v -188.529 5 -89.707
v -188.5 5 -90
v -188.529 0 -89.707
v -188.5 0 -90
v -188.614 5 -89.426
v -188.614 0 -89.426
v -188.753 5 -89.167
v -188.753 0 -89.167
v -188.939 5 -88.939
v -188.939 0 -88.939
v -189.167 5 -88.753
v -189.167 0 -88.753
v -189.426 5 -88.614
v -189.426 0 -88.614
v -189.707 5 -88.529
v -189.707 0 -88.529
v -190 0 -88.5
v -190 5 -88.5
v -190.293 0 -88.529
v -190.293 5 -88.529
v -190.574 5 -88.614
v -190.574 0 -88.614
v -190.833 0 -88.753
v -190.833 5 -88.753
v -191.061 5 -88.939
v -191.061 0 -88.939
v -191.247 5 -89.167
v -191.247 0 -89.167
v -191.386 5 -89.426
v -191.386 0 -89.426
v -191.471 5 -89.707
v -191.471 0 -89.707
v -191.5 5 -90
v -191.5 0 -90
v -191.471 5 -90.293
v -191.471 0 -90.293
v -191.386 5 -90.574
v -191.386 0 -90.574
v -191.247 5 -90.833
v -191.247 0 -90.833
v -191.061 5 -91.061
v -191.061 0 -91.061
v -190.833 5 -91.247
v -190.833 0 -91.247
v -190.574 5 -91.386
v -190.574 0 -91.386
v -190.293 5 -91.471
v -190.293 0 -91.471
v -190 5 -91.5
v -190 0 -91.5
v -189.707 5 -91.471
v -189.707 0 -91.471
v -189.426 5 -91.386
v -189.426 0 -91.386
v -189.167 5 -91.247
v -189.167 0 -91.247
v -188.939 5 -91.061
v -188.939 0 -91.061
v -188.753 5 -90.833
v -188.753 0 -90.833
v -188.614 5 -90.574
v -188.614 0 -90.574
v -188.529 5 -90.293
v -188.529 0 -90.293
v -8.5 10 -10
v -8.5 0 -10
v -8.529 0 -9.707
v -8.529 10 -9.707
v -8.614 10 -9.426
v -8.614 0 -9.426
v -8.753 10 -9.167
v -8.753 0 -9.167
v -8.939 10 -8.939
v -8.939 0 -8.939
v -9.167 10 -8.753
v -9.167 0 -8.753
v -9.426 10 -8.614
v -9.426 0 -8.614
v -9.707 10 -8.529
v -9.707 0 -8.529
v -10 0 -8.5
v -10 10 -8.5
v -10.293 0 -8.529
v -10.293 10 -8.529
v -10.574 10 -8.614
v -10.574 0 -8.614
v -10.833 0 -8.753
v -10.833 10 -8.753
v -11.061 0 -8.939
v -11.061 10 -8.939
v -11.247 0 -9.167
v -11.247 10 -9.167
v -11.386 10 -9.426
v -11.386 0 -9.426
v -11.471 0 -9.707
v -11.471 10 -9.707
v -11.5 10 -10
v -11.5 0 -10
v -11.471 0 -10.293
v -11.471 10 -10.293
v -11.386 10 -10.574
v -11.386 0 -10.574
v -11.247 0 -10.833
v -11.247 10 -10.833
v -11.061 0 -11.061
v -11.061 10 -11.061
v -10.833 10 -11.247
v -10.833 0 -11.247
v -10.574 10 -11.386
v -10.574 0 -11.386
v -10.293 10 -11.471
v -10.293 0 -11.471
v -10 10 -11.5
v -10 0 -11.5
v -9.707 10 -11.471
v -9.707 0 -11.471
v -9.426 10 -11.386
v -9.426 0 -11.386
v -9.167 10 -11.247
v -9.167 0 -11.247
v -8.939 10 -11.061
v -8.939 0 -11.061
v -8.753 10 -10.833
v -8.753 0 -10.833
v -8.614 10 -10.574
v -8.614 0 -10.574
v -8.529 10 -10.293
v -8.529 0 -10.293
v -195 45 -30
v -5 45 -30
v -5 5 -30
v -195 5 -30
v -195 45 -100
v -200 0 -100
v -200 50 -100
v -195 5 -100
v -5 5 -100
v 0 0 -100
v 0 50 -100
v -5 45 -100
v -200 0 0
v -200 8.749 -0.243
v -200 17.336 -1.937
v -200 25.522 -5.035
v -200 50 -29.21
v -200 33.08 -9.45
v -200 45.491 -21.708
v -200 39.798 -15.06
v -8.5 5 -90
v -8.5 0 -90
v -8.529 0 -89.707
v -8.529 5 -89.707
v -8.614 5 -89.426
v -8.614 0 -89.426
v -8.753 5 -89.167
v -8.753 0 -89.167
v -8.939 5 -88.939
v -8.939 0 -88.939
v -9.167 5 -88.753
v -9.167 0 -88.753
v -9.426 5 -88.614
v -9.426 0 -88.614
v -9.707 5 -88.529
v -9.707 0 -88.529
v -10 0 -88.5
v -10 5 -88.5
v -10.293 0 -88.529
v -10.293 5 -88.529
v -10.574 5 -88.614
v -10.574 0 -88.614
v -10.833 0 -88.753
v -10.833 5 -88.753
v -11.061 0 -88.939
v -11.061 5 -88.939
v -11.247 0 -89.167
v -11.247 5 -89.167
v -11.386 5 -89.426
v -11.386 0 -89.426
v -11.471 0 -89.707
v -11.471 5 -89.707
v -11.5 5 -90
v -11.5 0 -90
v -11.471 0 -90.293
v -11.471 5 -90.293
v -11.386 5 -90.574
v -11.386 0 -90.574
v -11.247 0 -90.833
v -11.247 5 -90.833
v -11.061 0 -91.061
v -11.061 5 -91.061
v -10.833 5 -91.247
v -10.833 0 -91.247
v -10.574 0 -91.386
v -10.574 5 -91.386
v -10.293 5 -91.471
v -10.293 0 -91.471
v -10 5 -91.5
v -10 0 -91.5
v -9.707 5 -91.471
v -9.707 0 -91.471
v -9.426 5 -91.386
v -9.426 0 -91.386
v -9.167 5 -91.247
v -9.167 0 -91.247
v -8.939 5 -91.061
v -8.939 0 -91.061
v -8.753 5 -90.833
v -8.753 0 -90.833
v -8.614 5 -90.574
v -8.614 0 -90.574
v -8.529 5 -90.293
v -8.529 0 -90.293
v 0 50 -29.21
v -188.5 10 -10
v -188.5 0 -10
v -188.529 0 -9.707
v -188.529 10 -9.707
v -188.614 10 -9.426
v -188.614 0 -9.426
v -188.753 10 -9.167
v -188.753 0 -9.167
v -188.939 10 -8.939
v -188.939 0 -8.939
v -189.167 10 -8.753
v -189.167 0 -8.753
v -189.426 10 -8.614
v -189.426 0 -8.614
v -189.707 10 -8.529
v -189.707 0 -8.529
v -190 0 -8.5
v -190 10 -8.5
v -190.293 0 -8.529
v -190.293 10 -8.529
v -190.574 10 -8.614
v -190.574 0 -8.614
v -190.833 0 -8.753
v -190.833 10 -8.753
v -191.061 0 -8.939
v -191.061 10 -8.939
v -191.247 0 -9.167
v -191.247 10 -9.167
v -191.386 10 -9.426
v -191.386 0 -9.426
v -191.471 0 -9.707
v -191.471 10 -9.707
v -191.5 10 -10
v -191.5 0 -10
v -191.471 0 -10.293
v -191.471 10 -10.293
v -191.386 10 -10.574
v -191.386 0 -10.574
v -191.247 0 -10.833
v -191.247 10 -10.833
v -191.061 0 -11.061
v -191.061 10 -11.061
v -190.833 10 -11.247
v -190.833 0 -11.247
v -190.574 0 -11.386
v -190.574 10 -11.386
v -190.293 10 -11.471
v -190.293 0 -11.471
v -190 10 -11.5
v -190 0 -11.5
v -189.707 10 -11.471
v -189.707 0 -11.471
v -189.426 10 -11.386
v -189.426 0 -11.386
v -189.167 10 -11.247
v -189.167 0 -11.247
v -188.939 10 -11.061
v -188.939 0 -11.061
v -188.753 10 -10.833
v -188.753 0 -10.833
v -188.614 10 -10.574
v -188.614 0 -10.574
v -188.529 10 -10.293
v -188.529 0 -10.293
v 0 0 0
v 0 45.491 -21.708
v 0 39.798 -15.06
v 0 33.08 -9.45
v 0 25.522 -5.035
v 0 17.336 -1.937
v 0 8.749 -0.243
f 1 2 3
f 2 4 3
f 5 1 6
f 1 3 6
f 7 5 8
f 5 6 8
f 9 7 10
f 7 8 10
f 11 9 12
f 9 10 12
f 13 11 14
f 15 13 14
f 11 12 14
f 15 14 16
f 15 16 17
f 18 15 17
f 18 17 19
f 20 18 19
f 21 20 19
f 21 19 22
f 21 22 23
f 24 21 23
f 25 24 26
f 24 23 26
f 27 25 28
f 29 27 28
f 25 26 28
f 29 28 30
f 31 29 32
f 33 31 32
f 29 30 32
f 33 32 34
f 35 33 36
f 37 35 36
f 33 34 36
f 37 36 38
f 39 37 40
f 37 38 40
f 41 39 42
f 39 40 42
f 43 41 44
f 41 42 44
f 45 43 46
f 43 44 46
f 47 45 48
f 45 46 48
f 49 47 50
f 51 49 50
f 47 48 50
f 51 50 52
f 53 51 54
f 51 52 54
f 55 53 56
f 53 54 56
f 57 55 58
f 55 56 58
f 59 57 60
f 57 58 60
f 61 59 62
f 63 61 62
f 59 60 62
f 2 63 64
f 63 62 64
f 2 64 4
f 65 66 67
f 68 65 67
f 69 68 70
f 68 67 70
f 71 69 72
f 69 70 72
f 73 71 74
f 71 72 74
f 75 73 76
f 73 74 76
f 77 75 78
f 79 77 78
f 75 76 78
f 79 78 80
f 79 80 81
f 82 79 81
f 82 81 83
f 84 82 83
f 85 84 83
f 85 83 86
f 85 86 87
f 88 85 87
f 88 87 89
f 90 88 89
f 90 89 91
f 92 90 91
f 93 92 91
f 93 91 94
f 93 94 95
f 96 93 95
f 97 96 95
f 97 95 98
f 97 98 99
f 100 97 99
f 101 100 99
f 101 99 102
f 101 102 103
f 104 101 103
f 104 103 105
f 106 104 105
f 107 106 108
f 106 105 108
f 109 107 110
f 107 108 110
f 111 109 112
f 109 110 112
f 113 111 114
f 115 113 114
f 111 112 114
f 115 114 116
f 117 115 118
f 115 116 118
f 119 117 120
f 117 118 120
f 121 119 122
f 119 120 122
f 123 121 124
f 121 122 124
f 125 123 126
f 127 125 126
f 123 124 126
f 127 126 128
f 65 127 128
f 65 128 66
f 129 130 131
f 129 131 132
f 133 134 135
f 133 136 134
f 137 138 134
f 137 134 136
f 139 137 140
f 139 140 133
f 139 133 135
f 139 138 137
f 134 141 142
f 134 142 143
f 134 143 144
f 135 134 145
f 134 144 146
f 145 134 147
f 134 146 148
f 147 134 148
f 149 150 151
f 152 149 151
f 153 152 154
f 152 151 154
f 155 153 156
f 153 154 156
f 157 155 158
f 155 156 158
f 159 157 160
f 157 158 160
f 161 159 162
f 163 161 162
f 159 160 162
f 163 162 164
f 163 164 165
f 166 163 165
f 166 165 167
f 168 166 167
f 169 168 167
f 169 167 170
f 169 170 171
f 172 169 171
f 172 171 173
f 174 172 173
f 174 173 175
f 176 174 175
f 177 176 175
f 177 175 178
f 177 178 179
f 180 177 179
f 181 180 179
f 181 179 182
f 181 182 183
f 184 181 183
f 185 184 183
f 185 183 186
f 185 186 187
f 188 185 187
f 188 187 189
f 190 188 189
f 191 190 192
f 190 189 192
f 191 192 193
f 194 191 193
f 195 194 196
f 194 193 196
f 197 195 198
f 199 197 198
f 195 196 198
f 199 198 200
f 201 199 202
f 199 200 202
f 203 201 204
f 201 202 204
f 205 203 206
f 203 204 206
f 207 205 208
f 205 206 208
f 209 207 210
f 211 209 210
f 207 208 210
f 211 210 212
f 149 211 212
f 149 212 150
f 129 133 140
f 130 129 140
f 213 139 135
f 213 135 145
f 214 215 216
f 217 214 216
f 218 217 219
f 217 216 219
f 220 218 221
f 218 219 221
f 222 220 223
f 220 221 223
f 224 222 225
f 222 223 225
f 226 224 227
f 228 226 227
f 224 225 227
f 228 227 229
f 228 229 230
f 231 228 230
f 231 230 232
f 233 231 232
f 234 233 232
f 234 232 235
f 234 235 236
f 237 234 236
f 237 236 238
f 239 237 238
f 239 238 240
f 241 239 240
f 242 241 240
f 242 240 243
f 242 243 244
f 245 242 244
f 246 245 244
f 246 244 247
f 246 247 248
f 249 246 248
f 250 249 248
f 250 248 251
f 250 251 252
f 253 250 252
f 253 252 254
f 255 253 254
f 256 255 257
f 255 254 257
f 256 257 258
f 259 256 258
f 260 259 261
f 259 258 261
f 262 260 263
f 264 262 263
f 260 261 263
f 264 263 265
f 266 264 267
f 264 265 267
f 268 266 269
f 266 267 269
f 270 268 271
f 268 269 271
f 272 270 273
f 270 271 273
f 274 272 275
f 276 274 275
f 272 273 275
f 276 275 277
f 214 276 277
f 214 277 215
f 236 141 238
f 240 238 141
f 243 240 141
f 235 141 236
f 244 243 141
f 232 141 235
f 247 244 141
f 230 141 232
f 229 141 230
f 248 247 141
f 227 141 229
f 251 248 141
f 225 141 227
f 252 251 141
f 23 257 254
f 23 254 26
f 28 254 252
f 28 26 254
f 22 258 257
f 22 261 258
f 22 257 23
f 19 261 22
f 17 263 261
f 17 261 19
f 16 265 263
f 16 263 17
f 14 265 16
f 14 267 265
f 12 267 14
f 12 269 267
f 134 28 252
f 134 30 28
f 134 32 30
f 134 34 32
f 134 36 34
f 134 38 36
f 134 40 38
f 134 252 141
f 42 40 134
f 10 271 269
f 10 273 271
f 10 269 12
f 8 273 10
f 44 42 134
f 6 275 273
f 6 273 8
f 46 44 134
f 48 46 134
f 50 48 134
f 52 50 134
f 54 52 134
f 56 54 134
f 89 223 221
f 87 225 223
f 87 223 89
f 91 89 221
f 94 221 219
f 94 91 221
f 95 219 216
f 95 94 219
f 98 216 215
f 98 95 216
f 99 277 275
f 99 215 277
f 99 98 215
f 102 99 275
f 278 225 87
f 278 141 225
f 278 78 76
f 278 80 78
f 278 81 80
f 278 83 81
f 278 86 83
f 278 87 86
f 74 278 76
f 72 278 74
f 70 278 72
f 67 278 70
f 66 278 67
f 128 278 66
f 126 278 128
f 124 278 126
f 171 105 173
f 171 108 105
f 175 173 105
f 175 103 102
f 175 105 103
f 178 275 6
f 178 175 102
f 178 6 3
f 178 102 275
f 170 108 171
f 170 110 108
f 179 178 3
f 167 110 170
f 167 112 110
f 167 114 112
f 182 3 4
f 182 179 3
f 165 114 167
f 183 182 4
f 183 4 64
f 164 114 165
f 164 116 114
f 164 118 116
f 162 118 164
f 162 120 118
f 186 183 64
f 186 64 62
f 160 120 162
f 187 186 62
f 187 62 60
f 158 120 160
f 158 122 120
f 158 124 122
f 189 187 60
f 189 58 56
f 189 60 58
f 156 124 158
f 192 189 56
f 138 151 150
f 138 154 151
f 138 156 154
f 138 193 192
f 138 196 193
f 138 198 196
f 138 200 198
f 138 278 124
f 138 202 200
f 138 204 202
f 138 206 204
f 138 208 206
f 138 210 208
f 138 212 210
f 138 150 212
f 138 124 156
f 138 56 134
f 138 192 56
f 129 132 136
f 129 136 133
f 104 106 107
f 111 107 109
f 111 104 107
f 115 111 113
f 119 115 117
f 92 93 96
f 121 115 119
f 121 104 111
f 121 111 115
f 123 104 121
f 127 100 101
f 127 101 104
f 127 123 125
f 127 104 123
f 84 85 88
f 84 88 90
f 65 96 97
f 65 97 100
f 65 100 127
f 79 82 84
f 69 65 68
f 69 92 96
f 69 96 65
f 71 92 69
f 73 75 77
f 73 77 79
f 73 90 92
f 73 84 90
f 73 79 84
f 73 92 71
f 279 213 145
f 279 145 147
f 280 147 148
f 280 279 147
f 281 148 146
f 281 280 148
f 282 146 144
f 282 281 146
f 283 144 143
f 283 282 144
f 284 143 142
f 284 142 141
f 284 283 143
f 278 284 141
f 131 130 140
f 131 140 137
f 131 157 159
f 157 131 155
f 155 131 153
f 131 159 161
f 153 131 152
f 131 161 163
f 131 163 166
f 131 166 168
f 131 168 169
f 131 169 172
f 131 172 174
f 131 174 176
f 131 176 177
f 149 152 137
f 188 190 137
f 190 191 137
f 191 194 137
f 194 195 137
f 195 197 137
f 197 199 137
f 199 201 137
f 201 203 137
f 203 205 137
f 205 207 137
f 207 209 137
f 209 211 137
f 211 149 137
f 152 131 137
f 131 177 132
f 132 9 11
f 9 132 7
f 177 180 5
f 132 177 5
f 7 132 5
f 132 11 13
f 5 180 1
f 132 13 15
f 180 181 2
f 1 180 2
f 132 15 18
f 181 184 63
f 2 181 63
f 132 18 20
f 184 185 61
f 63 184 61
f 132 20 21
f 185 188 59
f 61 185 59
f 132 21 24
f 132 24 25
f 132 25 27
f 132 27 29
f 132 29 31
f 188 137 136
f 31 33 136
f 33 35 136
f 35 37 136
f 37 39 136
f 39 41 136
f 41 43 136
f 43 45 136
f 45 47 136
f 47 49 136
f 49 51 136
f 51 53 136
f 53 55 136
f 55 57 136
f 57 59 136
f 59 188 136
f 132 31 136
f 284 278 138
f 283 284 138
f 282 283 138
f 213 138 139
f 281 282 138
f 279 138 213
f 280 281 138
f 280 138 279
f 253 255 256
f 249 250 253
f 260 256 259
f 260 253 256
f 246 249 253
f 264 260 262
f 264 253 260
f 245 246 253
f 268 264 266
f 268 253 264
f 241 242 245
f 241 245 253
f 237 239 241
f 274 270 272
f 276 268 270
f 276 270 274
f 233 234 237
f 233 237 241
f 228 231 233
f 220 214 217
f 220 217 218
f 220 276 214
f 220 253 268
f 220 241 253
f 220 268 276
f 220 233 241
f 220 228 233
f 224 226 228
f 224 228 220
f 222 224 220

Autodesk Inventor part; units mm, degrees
ref_plane "YZ Plane" through (0, 0, 0) normal (1, 0, 0) x (0, 1, 0)
ref_plane "XZ Plane" through (0, 0, 0) normal (0, 1, 0) x (-1, 0, 0)
ref_plane "XY Plane" through (0, 0, 0) normal (0, 0, 1) x (1, 0, 0)
sketch "Sketch1" plane through (0, 0, 0) normal (1, 0, 0) x (0, 1, 0)
  line L0 (0, 0) -> (0, -100)
  line L1 (0, -100) -> (50, -100)
  line L2 (50, -100) -> (50, -29.2097)
  arc A0 (50, -29.2097) -> (0, 0) centre (2.9206, -52.3995) ccw
  dimension "d0" = 100
  dimension "d1" = 50
extrude "Extrusion1" add sketch "Sketch1" against normal blind 200
sketch "Sketch4" plane through (0, 0, -100) normal (0, 0, -1) x (-1, 0, 0)
  line L0 (5, 45) -> (5, 5)
  line L1 (5, 5) -> (195, 5)
  line L2 (195, 5) -> (195, 45)
  line L3 (195, 45) -> (5, 45)
  line L4 (0, 50) -> (200, 50) projected
  line L5 (0, 0) -> (0, 50) projected
  line L6 (200, 50) -> (200, 0) projected
  line L7 (0, 0) -> (200, 0) projected
  dimension "d5" = 5
  dimension "d6" = 5
  dimension "d7" = 5
  dimension "d8" = 5
extrude "Extrusion2" cut sketch "Sketch4" against normal blind 70 contours L3 L2 L1 L0
sketch "Sketch5" plane through (0, 0, -100) normal (0, -1, 0) x (1, 0, 0)
  circle A0 centre (-10, 90) radius 1.5
  circle A1 centre (-10, 10) radius 1.5
  circle A2 centre (-190, 90) radius 1.5
  circle A3 centre (-190, 10) radius 1.5
  line L0 (0, 100) -> (-200, 100) projected
  line L1 (0, 0) -> (-200, 0) projected
  line L2 (0, 100) -> (0, 0) projected
  line L3 (-200, 0) -> (-200, 100) projected
  point P0 (-195, 0)
  dimension "d11" = 3
  dimension "d12" = 3
  dimension "d13" = 3
  dimension "d14" = 3
  dimension "d15" = 10
  dimension "d16" = 10
  dimension "d17" = 10
  dimension "d18" = 10
  dimension "d19" = 10
  dimension "d20" = 10
  dimension "d22" = 10
  dimension "d23" = 10
extrude "Extrusion3" cut sketch "Sketch5" against normal blind 10 contours A0 | A1 | A2 | A3
equation "\"d1\" = 0.5 * d0"
equation "\"d16\" = d15"
equation "\"d18\" = d17"
equation "\"d19\" = d17"
equation "\"d20\" = d15"
equation "\"d22\" = d17"
equation "\"d23\" = d15"
properties part number "Container"
